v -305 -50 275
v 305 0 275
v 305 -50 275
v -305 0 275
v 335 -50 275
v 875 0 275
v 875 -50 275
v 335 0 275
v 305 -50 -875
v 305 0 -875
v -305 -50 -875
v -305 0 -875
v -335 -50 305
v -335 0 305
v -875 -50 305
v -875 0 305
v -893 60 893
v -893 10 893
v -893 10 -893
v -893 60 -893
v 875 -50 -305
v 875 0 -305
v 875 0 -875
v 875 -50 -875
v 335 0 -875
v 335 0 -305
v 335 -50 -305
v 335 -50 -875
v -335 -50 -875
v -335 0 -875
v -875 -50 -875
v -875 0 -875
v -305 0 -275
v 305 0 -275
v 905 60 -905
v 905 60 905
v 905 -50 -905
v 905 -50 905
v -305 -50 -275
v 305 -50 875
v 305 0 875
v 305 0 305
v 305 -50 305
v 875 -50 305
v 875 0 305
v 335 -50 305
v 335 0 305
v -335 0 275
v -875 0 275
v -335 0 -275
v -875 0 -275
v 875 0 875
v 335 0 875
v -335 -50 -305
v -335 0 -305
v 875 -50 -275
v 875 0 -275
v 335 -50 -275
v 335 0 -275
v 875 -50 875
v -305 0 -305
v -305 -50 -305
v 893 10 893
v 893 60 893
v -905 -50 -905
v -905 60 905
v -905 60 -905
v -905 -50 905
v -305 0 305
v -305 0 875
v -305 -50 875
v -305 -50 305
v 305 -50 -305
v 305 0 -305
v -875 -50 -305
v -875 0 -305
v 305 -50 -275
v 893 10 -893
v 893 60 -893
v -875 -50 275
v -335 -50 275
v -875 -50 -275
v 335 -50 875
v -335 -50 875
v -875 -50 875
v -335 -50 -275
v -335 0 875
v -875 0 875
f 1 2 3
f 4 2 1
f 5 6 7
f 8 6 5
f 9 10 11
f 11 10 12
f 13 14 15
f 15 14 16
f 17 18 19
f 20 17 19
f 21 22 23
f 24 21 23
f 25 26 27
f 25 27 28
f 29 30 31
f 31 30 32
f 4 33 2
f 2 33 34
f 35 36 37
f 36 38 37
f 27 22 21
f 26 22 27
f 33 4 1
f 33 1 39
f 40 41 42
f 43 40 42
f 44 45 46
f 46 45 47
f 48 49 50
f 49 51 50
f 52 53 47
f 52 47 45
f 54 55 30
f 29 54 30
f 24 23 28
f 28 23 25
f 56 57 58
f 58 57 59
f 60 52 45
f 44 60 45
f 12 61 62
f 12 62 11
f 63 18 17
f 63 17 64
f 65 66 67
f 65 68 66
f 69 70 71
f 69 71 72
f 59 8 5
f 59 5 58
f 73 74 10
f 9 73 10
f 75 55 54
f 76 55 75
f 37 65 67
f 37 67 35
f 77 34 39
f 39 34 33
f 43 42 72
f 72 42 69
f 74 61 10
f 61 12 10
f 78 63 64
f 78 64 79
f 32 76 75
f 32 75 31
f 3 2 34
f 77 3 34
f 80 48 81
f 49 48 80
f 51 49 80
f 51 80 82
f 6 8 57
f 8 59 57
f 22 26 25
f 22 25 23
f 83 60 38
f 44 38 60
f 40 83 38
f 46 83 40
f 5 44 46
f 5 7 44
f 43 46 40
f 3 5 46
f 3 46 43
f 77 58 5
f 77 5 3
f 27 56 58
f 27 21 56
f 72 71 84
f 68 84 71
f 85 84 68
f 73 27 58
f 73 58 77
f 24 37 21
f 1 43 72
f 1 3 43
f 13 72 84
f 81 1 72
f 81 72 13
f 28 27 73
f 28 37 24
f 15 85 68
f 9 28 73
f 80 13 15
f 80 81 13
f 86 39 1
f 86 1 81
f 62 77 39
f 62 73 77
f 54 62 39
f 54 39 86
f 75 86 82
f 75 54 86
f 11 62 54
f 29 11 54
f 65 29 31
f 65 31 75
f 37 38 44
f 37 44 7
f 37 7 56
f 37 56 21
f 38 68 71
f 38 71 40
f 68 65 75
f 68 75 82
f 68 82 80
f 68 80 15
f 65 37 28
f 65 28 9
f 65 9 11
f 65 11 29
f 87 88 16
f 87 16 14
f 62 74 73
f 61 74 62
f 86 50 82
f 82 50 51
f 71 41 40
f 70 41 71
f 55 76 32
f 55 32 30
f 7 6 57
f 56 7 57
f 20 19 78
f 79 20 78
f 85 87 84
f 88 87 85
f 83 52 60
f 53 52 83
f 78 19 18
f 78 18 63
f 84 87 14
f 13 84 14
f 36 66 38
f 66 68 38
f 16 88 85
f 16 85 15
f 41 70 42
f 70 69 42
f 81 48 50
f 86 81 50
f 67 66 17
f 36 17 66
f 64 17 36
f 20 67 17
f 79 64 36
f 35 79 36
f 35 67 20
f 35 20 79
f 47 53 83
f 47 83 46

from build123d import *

# Parameters (mm, degrees)
ESQUISSE1_W        = 1810
ESQUISSE1_H        = 1810
BOSS_EXTRU_1_DEPTH = 10
ESQUISSE2_W        = 1810
ESQUISSE2_H        = 1810
ESQUISSE2_W_2      = 1750
ESQUISSE2_H_2      = 1750
BOSS_EXTRU_2_DEPTH = 50
ESQUISSE3_W        = 1750
ESQUISSE3_H        = 30
BOSS_EXTRU_3_DEPTH = 50
ESQUISSE4_W        = 30
ESQUISSE4_H        = 1750
BOSS_EXTRU_4_DEPTH = 50
ESQUISSE5_W        = 1810
ESQUISSE5_H        = 1810
ESQUISSE5_W_2      = 1786
ESQUISSE5_H_2      = 1786
BOSS_EXTRU_5_DEPTH = 50


with BuildPart() as part:
    # Esquisse1 → Boss.-Extru.1 (new body)
    with BuildSketch(Plane(origin=(0, 0, 0), x_dir=(1, 0, 0), z_dir=(0, 1, 0))):
        Rectangle(ESQUISSE1_W, ESQUISSE1_H)
    extrude(amount=BOSS_EXTRU_1_DEPTH)

    # Esquisse2 → Boss.-Extru.2 (add)
    with BuildSketch(Plane(origin=(0, 0, 0), x_dir=(-1, 0, 0), z_dir=(0, -1, 0))):
        Rectangle(ESQUISSE2_W, ESQUISSE2_H)
        Rectangle(ESQUISSE2_W_2, ESQUISSE2_H_2, mode=Mode.SUBTRACT)
    extrude(amount=BOSS_EXTRU_2_DEPTH)

    # Esquisse3 → Boss.-Extru.3 (add)
    with BuildSketch(Plane(origin=(0, 0, 0), x_dir=(-1, 0, 0), z_dir=(0, -1, 0))):
        with Locations((0, -290)):
            Rectangle(ESQUISSE3_W, ESQUISSE3_H)
        with Locations((0, 290)):
            Rectangle(ESQUISSE3_W, ESQUISSE3_H)
    extrude(amount=BOSS_EXTRU_3_DEPTH)

    # Esquisse4 → Boss.-Extru.4 (add)
    with BuildSketch(Plane(origin=(0, 0, 0), x_dir=(-1, 0, 0), z_dir=(0, -1, 0))):
        with Locations((320, 0)):
            Rectangle(ESQUISSE4_W, ESQUISSE4_H)
        with Locations((-320, 0)):
            Rectangle(ESQUISSE4_W, ESQUISSE4_H)
    extrude(amount=BOSS_EXTRU_4_DEPTH)

    # Esquisse5 → Boss.-Extru.5 (add)
    with BuildSketch(Plane(origin=(0, 10, 0), x_dir=(1, 0, 0), z_dir=(0, 1, 0))):
        Rectangle(ESQUISSE5_W, ESQUISSE5_H)
        Rectangle(ESQUISSE5_W_2, ESQUISSE5_H_2, mode=Mode.SUBTRACT)
    extrude(amount=BOSS_EXTRU_5_DEPTH)


solid = part.part
